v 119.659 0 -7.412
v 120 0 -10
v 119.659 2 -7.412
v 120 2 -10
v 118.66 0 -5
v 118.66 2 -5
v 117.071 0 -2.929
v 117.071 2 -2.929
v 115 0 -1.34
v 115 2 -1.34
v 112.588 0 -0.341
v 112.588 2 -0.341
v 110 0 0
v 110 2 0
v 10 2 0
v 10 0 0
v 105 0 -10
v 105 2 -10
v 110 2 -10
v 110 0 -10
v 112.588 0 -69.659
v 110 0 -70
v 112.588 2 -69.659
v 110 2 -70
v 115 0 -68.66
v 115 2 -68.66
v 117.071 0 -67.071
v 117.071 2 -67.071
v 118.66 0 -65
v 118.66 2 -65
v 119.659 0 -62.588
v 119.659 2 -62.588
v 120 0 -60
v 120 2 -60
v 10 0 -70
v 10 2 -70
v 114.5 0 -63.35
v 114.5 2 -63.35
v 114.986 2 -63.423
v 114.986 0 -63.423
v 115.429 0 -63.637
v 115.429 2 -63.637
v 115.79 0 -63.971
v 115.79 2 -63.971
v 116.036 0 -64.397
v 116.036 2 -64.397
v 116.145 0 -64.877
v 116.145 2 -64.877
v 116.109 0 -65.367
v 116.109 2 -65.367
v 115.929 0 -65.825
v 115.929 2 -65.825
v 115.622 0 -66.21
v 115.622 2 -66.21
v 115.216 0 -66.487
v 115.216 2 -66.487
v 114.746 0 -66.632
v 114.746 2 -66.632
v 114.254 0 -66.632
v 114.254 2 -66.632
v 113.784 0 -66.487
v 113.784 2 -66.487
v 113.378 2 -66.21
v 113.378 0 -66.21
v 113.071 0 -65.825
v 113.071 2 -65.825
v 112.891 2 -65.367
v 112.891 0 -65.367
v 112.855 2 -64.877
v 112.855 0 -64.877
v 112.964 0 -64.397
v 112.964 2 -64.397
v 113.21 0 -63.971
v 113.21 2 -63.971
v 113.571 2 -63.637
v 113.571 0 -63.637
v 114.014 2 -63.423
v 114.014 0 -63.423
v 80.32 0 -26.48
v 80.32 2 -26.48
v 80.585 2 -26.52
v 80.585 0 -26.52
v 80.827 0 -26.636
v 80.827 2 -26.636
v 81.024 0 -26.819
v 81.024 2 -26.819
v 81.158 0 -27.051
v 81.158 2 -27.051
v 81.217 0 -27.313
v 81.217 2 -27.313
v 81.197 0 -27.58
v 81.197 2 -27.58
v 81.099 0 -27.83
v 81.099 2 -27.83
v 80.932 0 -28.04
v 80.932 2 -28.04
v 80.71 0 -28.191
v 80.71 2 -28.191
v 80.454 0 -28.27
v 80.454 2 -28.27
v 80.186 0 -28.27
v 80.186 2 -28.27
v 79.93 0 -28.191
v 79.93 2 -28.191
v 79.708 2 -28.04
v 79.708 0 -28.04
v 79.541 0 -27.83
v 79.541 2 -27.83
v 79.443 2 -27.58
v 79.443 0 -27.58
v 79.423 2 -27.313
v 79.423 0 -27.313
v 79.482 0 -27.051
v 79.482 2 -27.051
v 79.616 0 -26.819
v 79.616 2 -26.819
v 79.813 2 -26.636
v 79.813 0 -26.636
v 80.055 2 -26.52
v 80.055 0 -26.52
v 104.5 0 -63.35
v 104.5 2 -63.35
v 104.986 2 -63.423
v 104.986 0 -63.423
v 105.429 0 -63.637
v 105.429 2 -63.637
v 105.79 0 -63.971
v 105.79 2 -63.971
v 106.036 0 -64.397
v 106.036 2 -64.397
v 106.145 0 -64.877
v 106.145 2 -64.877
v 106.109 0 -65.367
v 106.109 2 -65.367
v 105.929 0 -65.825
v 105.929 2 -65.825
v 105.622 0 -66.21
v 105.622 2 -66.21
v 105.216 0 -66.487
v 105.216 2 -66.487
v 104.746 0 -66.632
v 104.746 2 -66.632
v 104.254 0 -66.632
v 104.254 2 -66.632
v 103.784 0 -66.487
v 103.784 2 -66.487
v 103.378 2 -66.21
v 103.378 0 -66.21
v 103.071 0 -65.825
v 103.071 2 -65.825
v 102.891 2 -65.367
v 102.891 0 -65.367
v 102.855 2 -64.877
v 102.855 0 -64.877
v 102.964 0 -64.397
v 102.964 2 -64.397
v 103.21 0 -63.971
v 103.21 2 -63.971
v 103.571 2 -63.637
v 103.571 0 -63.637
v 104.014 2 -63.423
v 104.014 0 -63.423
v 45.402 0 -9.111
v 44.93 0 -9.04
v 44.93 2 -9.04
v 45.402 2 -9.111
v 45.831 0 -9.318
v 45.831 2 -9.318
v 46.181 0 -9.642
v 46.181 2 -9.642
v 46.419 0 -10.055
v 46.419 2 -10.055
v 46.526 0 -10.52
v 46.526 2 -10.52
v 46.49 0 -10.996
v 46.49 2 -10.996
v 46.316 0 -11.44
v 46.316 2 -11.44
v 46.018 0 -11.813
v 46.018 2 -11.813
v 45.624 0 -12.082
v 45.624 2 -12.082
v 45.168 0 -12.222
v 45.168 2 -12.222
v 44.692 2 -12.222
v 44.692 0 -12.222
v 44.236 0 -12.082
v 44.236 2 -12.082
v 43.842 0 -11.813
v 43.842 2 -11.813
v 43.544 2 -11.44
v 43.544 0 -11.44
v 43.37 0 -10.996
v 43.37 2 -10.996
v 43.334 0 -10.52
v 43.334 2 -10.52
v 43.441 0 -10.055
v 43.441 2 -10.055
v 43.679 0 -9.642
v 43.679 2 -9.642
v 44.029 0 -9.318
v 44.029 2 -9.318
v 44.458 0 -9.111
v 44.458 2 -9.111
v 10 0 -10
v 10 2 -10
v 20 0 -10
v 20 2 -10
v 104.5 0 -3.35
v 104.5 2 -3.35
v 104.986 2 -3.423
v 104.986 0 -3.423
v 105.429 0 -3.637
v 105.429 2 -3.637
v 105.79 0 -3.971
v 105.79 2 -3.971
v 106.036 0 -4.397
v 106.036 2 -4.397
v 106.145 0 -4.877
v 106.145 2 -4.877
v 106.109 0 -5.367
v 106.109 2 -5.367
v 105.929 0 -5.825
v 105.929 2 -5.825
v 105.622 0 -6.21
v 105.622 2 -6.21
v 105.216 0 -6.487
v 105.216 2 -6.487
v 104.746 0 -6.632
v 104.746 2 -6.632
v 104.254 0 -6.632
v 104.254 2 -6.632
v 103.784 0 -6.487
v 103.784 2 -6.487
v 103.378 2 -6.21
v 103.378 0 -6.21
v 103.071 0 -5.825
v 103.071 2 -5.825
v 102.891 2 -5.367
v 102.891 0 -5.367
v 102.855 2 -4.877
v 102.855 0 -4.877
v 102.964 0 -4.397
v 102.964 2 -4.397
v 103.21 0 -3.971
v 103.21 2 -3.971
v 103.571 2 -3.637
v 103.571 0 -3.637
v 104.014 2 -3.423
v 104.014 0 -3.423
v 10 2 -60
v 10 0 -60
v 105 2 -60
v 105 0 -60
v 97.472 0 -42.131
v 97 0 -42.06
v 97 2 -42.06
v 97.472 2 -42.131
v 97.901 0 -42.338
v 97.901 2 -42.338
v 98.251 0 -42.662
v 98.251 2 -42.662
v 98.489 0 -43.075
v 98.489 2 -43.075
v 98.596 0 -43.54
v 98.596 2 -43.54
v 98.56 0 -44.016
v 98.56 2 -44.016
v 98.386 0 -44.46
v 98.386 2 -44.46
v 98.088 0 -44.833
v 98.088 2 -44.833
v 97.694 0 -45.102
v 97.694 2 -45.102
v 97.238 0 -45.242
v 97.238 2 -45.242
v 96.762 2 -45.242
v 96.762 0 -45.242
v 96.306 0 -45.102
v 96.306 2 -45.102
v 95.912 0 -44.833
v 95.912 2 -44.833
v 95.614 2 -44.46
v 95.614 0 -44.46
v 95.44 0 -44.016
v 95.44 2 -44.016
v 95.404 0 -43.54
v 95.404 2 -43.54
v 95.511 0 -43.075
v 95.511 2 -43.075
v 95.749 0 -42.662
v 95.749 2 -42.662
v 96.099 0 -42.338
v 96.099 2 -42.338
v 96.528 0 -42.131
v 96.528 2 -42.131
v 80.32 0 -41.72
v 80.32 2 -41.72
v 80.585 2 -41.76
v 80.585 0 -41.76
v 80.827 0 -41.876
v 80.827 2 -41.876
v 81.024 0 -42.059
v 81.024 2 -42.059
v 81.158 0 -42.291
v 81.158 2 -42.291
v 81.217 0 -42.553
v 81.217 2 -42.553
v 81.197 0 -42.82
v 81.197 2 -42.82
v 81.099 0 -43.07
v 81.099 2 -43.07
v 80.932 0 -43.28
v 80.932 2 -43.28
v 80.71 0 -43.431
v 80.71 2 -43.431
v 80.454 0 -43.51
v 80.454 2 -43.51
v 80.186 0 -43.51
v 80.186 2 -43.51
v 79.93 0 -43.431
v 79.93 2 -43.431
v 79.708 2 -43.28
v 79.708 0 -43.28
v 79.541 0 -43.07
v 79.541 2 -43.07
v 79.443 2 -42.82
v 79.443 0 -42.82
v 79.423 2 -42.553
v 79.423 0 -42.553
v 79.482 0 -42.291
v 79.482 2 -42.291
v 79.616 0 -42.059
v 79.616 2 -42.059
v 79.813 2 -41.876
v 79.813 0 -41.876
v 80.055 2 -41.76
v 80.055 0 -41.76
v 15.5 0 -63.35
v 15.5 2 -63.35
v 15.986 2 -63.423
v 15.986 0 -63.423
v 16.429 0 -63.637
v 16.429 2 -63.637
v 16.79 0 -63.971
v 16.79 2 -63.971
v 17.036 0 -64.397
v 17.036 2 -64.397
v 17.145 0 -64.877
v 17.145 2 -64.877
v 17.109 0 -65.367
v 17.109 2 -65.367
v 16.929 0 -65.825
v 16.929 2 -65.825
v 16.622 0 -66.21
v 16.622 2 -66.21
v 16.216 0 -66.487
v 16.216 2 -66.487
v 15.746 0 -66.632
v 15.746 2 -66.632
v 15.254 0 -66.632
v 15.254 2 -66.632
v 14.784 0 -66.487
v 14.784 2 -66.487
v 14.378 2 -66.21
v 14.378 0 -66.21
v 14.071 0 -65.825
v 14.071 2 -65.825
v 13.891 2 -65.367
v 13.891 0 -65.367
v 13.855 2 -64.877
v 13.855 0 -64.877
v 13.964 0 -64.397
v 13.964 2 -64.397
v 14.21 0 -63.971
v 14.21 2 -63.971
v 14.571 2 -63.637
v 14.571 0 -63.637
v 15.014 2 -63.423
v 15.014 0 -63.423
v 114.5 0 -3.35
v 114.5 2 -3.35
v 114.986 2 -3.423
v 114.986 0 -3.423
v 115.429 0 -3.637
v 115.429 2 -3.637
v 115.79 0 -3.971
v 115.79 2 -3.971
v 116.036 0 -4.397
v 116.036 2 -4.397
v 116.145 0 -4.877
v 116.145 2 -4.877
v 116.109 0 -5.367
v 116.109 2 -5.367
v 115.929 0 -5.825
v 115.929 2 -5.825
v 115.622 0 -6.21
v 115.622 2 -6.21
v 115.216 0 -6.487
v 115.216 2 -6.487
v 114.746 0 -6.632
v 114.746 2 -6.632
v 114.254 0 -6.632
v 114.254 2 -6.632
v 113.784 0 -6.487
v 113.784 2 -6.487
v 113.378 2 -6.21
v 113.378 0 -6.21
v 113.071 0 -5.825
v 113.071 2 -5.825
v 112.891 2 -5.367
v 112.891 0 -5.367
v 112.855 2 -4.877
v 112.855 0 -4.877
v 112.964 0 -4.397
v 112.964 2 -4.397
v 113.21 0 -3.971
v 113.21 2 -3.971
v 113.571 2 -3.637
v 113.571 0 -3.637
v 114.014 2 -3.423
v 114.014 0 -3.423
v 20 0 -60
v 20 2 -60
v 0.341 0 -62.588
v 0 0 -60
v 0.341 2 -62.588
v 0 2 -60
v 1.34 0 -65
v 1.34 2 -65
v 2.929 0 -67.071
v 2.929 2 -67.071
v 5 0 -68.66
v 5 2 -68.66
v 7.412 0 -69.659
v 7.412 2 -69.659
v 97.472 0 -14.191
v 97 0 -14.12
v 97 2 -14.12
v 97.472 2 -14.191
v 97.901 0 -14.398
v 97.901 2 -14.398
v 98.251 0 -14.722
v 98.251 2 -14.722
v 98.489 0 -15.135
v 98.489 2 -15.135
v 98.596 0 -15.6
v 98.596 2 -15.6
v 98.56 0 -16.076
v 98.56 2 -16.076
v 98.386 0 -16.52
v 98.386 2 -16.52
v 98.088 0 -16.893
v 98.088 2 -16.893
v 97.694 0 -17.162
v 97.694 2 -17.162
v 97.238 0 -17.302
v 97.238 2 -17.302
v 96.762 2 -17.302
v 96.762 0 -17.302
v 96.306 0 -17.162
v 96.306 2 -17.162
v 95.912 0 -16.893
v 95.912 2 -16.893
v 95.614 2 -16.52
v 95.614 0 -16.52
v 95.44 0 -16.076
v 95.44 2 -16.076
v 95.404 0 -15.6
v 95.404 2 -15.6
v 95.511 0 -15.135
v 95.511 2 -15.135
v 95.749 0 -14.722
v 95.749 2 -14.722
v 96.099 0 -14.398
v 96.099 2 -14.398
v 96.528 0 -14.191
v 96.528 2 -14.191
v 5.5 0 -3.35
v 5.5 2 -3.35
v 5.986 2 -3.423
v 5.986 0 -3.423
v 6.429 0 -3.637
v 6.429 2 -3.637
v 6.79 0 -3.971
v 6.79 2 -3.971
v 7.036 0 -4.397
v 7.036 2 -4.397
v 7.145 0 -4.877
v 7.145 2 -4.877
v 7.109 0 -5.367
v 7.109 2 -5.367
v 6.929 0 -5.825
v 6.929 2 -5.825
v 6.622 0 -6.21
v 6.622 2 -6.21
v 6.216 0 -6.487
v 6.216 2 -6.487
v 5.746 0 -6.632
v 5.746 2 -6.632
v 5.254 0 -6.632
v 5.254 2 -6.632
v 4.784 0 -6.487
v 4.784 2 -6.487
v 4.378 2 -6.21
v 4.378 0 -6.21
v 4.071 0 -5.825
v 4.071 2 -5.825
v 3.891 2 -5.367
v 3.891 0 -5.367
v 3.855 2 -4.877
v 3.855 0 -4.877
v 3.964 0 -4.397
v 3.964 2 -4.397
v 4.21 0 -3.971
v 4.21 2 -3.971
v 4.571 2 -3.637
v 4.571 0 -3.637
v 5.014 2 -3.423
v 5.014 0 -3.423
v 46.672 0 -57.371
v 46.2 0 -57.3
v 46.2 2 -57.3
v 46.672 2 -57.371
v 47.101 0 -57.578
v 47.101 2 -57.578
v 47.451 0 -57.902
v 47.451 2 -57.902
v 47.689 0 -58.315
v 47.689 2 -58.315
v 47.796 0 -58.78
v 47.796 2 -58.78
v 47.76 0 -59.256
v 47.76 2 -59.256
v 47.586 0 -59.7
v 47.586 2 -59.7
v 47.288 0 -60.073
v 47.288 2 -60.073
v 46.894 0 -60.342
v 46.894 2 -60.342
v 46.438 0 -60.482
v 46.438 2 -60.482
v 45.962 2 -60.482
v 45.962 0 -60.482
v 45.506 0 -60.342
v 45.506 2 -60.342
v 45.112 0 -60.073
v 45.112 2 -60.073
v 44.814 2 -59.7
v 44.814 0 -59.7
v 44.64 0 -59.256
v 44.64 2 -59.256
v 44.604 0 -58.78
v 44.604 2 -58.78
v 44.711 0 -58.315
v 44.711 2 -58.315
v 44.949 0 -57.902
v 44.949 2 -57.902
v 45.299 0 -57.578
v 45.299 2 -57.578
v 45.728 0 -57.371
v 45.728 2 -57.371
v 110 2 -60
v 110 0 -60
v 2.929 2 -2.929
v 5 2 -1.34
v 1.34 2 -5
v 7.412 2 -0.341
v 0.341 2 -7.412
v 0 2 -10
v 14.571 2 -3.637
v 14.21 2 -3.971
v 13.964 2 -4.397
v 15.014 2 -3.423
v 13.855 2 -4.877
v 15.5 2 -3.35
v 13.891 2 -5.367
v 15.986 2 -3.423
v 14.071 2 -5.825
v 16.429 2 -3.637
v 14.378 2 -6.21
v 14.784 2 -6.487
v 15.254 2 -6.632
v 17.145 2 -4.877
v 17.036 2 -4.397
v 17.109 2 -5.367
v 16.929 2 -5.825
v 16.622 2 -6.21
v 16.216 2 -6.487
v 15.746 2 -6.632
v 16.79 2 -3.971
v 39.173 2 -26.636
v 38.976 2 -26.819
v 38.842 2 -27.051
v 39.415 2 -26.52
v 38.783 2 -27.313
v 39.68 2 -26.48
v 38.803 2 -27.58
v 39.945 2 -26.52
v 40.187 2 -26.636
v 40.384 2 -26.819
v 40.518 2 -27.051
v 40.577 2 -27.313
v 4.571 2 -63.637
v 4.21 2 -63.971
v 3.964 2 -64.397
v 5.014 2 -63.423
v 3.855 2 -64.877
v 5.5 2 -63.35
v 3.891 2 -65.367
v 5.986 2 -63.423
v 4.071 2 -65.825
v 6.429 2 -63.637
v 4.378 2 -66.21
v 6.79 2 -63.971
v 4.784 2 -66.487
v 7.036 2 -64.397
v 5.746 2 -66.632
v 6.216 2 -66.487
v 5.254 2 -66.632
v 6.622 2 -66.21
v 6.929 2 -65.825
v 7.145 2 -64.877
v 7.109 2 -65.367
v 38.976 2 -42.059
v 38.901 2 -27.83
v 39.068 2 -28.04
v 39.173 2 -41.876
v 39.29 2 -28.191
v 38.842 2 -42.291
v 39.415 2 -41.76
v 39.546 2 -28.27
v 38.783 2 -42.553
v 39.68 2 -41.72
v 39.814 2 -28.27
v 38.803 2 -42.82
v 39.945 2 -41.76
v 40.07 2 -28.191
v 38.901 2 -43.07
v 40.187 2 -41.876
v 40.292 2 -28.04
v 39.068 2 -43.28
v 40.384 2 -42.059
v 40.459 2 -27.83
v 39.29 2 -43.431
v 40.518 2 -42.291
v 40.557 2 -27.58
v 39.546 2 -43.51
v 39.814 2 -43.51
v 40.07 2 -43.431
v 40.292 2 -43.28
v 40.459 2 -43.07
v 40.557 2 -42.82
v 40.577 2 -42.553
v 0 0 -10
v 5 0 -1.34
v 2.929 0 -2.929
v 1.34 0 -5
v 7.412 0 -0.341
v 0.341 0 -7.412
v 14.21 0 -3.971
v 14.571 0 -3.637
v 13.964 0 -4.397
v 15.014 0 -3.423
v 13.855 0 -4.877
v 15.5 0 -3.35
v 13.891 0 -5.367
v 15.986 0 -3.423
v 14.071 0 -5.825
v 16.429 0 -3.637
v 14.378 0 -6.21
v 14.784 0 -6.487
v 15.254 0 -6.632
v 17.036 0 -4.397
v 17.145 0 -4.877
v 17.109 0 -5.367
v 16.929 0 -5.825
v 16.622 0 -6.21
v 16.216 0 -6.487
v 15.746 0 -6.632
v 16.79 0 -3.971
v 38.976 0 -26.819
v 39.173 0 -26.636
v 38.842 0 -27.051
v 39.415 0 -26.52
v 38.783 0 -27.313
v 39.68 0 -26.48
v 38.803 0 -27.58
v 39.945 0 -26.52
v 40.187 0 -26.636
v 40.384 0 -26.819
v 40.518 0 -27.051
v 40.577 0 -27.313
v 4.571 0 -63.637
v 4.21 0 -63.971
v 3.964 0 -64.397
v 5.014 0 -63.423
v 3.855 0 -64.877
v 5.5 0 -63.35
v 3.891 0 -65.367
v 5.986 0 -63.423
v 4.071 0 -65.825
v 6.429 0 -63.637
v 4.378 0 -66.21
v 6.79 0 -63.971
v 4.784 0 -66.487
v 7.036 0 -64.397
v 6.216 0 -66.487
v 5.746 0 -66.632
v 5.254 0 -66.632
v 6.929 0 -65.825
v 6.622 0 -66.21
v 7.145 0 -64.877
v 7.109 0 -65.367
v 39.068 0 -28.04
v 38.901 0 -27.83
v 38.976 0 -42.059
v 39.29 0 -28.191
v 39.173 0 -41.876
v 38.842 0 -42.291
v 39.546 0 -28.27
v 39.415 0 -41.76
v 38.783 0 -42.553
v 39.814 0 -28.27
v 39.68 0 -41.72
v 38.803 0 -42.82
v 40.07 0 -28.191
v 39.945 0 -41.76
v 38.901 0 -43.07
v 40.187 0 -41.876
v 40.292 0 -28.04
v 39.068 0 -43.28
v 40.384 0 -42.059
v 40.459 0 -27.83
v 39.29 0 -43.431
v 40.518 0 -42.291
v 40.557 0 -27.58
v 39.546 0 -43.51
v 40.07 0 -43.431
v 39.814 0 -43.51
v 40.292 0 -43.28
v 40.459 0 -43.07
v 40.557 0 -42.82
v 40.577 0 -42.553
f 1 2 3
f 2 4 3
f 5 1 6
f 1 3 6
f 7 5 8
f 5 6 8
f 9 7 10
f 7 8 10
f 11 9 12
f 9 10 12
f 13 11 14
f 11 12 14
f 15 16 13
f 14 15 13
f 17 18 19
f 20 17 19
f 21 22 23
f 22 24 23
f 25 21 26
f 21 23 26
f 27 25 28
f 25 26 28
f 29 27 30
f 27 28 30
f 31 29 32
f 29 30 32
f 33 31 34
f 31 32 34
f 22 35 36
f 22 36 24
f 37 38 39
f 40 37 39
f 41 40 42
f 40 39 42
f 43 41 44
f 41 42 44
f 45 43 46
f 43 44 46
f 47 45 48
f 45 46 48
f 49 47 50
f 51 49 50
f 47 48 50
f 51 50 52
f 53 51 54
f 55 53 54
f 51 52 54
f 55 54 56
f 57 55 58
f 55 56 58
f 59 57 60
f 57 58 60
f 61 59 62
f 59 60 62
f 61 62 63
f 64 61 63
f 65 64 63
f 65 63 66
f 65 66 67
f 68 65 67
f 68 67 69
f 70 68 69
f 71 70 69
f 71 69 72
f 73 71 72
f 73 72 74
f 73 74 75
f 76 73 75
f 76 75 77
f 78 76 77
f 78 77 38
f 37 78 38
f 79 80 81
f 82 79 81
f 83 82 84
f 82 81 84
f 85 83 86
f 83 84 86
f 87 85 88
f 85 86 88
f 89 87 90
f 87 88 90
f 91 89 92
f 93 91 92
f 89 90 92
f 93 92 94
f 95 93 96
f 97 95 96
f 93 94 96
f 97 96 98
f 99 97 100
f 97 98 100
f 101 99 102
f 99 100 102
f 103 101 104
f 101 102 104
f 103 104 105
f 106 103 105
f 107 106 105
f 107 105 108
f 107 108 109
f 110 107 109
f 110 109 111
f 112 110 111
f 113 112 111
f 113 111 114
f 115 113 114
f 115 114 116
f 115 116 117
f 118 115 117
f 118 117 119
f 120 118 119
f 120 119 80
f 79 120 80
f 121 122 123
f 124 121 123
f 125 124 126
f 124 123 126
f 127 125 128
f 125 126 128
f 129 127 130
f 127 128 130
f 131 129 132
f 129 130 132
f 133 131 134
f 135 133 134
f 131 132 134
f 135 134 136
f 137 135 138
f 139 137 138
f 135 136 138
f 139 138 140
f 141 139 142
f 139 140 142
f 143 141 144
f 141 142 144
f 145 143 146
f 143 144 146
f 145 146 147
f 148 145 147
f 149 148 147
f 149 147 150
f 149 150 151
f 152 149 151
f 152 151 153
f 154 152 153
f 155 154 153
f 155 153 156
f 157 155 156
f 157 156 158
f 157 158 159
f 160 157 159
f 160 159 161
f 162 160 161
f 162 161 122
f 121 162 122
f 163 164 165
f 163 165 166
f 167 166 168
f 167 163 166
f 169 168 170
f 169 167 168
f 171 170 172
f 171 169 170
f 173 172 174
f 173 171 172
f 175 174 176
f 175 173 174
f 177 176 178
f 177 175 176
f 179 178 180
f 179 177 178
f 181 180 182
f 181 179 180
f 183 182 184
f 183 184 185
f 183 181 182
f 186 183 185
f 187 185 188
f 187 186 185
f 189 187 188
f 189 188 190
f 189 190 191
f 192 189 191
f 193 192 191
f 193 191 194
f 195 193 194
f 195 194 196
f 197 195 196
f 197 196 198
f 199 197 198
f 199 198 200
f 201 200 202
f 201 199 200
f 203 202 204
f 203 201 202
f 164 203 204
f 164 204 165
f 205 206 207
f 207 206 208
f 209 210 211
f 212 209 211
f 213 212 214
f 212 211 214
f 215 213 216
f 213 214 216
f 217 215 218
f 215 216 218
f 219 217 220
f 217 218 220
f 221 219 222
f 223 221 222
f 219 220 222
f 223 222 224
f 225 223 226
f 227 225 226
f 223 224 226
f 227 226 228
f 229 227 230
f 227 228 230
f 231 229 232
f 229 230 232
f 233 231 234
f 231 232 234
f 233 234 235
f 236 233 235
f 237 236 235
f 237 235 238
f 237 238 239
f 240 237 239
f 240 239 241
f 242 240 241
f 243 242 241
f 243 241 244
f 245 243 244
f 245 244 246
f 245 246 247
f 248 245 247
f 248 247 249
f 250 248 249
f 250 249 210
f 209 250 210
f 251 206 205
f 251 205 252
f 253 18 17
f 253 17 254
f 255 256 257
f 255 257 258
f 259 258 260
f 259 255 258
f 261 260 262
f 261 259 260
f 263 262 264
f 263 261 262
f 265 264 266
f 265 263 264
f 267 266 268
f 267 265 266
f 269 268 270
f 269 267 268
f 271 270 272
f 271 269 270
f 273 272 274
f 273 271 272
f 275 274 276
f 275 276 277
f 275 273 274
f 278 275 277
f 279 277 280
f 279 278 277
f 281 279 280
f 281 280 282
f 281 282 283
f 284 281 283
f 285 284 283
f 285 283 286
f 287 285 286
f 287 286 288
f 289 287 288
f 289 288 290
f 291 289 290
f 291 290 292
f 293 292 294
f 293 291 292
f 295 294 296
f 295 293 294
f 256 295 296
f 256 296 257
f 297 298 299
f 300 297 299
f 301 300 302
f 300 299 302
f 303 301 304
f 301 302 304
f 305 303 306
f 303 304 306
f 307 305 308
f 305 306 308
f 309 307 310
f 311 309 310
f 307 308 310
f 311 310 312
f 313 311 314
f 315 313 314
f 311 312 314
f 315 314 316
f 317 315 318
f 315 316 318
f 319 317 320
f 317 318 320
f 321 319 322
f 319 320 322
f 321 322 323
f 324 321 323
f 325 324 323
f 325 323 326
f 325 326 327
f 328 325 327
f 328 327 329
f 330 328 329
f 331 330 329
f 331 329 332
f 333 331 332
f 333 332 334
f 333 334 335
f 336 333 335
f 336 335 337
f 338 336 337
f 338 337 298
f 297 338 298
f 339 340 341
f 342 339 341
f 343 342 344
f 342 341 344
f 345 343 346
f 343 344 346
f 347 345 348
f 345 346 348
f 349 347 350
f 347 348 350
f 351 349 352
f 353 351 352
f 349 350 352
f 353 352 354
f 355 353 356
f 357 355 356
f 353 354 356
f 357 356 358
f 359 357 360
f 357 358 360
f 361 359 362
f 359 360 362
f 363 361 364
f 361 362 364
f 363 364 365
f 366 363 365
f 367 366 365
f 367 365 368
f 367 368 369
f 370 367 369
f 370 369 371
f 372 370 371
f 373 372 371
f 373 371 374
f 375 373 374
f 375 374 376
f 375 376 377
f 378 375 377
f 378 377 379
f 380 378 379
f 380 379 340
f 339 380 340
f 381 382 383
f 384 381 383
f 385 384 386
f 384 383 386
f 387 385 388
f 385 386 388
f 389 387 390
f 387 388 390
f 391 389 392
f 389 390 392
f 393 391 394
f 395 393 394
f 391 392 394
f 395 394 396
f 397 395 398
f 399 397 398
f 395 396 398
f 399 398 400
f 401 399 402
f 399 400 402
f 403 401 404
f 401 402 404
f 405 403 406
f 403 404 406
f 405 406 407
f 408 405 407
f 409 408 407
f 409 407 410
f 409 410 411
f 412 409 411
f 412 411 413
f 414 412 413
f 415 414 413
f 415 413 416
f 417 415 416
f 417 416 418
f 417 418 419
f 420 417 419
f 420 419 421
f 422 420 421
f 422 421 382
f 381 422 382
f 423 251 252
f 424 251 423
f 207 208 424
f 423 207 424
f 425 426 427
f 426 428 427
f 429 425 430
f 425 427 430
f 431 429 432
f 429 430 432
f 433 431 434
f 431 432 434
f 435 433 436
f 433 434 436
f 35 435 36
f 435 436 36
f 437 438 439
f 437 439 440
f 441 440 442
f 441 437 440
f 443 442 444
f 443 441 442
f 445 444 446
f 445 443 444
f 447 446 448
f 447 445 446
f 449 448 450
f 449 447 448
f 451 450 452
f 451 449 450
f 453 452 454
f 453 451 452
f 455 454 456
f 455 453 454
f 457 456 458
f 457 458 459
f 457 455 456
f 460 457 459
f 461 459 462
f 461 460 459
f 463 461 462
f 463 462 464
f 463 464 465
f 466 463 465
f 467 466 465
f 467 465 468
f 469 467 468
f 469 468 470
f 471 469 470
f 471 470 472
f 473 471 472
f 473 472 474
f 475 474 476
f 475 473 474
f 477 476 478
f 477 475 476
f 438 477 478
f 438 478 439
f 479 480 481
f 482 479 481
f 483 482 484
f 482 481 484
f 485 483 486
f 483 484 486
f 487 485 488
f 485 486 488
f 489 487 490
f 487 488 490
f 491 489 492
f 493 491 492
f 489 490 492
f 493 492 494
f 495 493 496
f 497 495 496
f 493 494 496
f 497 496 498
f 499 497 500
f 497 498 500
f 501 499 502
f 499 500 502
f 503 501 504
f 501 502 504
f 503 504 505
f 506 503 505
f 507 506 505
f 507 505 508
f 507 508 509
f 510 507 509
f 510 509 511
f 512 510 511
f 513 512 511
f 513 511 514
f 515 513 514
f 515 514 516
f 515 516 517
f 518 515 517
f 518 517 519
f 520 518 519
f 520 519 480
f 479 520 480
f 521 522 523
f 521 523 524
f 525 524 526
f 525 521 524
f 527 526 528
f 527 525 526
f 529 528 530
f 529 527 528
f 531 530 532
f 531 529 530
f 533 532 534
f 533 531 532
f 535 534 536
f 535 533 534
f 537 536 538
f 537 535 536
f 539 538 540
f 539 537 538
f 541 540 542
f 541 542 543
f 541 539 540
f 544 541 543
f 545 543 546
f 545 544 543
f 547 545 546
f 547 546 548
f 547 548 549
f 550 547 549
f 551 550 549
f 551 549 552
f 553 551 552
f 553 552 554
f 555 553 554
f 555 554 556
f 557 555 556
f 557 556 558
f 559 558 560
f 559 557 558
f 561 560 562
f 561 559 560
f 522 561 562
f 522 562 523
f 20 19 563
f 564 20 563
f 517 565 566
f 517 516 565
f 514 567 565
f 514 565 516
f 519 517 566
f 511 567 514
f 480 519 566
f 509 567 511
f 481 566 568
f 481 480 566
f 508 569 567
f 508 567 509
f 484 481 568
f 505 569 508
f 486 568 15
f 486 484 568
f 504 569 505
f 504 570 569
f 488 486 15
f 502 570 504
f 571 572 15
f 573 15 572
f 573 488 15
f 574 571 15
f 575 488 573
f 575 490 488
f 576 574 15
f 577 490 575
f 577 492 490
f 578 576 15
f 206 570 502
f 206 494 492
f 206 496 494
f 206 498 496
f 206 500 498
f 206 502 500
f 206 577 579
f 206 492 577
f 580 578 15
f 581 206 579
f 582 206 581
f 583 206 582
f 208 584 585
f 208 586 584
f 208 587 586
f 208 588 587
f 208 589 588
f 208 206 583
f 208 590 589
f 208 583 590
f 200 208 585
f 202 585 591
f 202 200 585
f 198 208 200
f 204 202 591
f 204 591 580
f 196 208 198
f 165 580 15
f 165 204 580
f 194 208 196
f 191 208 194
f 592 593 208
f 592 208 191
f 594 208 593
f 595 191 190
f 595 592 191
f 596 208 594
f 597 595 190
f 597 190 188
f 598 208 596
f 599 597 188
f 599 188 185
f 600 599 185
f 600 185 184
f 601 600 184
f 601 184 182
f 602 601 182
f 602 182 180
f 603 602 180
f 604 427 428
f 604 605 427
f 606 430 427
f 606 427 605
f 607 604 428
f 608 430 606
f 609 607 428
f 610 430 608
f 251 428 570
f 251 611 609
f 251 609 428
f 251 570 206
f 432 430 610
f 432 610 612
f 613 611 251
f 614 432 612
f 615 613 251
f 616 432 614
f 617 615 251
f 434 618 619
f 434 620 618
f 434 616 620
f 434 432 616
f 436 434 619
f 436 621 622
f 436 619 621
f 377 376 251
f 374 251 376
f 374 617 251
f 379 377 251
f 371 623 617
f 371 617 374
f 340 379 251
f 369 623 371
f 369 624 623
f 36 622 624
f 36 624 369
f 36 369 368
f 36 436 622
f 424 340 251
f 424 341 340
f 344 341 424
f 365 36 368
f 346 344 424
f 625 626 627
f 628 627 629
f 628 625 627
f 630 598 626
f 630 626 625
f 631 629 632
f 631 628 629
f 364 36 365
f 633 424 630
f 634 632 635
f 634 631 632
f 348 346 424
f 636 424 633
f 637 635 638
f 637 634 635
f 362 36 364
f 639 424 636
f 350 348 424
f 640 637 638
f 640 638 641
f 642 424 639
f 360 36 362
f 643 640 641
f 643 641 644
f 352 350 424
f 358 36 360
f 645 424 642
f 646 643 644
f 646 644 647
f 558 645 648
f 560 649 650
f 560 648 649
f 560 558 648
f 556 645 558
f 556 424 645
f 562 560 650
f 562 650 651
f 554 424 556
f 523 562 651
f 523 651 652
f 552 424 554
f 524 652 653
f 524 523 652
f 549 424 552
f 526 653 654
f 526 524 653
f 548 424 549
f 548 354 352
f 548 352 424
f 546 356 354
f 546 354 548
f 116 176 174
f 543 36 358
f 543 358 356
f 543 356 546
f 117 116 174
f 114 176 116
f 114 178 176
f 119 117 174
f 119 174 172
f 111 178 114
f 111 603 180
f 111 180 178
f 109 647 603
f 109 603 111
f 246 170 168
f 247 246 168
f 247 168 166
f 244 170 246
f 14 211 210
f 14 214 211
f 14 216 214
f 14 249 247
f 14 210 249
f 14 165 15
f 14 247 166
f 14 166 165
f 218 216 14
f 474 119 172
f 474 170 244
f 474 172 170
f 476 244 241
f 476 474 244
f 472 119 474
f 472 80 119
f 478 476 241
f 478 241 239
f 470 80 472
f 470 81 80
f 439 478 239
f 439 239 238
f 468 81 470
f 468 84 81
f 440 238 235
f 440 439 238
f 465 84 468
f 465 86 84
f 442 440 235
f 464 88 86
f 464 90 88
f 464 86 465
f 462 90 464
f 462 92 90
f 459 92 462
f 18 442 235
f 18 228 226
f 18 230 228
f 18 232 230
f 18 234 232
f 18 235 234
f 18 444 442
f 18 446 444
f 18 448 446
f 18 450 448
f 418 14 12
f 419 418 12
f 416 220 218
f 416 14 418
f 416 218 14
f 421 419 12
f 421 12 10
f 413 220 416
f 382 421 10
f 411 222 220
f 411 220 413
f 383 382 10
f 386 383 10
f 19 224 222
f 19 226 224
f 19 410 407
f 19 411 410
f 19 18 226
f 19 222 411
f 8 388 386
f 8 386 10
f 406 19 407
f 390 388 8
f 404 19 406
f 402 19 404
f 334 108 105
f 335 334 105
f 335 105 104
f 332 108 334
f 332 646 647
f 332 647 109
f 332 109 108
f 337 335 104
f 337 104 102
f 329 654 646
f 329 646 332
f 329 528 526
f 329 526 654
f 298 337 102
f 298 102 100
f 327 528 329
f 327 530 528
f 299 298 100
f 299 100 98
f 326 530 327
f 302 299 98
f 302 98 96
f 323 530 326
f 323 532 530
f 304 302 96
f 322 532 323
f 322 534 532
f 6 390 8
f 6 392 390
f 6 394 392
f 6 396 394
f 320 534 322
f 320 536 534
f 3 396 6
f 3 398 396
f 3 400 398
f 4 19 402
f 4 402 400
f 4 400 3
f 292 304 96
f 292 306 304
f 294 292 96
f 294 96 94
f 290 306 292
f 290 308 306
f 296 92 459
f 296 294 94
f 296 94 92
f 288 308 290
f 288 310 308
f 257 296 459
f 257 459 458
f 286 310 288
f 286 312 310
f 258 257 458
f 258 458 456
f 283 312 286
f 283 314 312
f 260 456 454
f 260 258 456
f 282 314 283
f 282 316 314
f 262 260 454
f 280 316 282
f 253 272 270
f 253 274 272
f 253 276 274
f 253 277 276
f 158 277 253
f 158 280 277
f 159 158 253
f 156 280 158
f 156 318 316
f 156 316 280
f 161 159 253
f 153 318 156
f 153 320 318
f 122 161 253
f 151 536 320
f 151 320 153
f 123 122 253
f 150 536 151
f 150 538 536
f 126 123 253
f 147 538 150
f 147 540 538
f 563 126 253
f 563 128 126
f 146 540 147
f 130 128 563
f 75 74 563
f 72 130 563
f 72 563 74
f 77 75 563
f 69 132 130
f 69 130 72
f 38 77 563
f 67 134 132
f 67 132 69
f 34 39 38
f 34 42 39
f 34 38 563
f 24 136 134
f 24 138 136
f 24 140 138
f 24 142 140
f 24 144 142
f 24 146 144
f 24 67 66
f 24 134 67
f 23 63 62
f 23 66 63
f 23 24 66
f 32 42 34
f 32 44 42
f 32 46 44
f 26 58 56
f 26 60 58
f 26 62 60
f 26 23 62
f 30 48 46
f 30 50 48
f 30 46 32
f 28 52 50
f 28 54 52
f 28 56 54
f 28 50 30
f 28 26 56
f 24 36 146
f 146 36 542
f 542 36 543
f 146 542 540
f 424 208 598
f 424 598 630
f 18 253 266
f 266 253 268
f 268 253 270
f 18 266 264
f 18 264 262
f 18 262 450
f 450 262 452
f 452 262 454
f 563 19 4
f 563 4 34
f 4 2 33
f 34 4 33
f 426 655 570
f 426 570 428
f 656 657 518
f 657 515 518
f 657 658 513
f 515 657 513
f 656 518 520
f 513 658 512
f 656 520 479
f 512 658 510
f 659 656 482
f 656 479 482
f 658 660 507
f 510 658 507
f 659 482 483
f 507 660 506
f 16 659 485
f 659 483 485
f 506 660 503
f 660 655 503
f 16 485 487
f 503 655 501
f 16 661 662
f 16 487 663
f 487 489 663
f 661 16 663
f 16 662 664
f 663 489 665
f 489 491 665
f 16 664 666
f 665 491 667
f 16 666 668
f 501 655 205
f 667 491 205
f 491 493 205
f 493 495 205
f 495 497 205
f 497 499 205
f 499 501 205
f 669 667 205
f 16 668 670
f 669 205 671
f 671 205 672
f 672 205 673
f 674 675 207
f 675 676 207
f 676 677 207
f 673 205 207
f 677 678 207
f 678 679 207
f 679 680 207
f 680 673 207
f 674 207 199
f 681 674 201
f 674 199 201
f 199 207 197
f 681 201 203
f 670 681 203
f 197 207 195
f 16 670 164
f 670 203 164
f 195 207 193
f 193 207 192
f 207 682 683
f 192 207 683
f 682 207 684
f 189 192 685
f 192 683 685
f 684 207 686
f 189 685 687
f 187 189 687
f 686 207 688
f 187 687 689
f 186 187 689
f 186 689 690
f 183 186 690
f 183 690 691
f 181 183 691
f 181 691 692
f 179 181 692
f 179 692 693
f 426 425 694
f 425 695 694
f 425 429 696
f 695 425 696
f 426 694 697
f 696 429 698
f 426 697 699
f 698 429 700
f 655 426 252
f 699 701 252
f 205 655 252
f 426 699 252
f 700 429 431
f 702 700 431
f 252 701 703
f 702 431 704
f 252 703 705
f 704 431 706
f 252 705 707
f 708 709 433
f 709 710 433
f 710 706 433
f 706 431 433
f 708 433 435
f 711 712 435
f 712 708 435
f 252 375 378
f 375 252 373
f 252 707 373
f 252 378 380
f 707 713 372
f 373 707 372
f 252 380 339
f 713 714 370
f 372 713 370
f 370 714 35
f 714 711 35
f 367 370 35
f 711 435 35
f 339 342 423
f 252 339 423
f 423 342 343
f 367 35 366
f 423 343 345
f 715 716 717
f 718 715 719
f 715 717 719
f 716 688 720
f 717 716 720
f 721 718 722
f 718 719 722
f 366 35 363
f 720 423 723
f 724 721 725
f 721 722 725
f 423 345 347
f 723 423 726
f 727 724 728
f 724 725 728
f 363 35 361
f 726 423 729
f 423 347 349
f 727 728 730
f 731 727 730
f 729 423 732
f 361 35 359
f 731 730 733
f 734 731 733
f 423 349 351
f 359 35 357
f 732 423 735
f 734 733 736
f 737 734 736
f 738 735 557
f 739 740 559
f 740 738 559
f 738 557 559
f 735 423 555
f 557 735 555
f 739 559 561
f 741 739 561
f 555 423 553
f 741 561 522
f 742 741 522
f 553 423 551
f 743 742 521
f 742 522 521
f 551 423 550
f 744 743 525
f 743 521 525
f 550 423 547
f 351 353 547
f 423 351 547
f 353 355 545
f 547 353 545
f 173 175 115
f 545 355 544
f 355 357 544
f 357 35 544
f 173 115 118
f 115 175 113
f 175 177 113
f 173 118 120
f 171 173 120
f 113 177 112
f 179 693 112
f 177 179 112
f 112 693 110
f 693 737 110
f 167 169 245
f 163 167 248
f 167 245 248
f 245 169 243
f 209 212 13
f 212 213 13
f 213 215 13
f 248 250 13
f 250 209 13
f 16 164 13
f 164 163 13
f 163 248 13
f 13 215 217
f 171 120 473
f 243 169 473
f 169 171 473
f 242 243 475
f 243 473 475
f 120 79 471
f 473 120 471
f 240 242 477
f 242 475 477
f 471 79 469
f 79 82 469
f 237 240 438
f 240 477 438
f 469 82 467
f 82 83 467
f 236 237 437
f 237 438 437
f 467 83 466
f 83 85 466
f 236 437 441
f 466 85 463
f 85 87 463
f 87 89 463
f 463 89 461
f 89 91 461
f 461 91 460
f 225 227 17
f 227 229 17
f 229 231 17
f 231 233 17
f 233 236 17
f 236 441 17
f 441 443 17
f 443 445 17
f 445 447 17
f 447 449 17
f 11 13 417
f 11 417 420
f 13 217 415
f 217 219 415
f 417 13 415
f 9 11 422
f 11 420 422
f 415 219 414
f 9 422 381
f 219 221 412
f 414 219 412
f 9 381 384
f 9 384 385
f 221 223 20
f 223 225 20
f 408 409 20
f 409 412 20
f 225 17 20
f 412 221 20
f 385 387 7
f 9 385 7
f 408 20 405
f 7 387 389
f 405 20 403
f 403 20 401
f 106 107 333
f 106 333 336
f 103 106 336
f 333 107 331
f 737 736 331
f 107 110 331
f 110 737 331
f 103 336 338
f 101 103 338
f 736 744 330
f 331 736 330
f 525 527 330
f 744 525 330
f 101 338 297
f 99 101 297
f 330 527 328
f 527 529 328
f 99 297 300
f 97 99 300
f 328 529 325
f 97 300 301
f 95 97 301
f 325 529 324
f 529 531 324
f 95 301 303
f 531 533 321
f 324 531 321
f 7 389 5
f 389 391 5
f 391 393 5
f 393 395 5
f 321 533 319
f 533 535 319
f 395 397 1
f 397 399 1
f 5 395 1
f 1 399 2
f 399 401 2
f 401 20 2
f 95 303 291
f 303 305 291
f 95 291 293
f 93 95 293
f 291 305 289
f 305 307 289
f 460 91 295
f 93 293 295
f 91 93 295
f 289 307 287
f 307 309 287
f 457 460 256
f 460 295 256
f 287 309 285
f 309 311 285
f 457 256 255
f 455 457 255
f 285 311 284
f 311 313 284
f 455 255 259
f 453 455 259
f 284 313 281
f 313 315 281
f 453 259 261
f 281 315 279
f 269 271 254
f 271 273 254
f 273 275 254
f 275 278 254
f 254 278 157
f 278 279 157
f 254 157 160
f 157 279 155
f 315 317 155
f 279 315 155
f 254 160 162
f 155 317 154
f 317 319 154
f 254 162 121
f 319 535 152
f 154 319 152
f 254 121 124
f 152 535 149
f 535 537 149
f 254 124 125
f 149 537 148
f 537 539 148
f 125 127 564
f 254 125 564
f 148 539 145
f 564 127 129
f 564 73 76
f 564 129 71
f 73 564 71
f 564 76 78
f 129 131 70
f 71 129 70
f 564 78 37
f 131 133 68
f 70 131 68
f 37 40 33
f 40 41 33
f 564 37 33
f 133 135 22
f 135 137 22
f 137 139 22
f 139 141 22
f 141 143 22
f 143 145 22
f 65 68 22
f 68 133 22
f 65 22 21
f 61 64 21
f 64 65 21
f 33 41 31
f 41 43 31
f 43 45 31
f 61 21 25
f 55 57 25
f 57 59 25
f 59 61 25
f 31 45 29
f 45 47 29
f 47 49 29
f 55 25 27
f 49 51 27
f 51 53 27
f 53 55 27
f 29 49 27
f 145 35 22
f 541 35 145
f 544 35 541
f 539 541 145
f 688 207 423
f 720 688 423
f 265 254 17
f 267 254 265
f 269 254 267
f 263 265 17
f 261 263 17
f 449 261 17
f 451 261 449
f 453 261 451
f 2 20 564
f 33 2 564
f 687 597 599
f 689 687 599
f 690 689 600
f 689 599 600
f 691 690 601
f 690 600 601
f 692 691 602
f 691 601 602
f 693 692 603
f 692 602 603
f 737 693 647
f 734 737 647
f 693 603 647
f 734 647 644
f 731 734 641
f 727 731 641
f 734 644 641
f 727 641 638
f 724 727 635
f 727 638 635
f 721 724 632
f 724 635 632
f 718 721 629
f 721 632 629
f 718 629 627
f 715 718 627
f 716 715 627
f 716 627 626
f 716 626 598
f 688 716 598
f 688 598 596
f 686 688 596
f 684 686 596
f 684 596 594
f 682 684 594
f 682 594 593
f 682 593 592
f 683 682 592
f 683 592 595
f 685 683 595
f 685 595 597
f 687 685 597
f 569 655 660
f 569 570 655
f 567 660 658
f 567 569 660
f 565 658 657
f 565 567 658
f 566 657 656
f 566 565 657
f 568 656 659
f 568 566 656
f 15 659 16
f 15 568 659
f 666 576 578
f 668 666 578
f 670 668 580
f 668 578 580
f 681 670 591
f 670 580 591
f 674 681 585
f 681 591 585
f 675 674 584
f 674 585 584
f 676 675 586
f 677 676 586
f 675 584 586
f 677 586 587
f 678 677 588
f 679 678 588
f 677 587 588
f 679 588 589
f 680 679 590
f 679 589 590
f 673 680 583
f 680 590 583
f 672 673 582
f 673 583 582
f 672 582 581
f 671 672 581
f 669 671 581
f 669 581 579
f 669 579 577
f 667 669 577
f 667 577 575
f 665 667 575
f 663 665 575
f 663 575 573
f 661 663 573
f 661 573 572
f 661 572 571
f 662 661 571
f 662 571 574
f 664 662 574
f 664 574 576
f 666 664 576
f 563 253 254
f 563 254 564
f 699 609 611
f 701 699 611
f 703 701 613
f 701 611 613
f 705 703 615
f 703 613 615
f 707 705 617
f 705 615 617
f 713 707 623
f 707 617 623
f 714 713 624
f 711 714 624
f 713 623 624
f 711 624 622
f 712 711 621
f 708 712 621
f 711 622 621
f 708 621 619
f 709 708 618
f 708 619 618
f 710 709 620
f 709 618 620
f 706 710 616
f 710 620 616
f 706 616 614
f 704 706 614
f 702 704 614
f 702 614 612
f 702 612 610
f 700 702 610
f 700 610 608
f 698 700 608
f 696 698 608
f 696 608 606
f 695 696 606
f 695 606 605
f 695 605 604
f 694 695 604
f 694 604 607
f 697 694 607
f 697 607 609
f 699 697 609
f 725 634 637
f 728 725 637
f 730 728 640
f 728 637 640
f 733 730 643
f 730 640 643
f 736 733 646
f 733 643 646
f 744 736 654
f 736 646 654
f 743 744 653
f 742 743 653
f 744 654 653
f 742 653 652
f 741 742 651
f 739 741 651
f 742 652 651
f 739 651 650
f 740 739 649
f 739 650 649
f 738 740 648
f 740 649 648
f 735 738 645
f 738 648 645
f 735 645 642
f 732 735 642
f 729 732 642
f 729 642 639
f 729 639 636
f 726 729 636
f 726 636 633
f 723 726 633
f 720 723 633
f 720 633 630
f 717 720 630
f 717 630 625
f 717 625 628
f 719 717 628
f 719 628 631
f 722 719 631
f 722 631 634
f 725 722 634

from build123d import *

# Parameters (mm, degrees)
PLANTAICEZUM_W          = 120
PLANTAICEZUM_H          = 70
PLANTAICEZUM_R          = 1.6
SALIENTE_EXTRUIR3_DEPTH = 2
REDONDEO1_R             = 10
REDONDEO2_R             = 10
REDONDEO3_R             = 10
REDONDEO4_R             = 10
CROQUIS1_W              = 10
CROQUIS1_H              = 50
CROQUIS1_W_2            = 5
CORTAR_EXTRUIR1_DEPTH   = 5
CROQUIS4_R              = 1.65
CORTAR_EXTRUIR2_DEPTH   = 5
CROQUIS6_R              = 0.9
CORTAR_EXTRUIR4_DEPTH   = 10


with BuildPart() as part:
    # PlantaIceZum → Saliente-Extruir3 (new body)
    with BuildSketch(Plane(origin=(0, 0, 0), x_dir=(1, 0, 0), z_dir=(0, 1, 0))):
        with Locations((60, 35)):
            Rectangle(PLANTAICEZUM_W, PLANTAICEZUM_H)
        with Locations(Location((97, 43.66, 0), (0, 0, 270))):
            Circle(PLANTAICEZUM_R, mode=Mode.SUBTRACT)
        with Locations(Location((46.2, 58.9, 0), (0, 0, 270))):
            Circle(PLANTAICEZUM_R, mode=Mode.SUBTRACT)
        with Locations(Location((44.93, 10.64, 0), (0, 0, 270))):
            Circle(PLANTAICEZUM_R, mode=Mode.SUBTRACT)
        with Locations(Location((97, 15.72, 0), (0, 0, 270))):
            Circle(PLANTAICEZUM_R, mode=Mode.SUBTRACT)
    extrude(amount=SALIENTE_EXTRUIR3_DEPTH)

    # Redondeo1
    redondeo1_edges = [part.edges().sort_by_distance(p)[0] for p in [
        (0, 1, 0),
    ]]
    fillet(redondeo1_edges, radius=REDONDEO1_R)

    # Redondeo2
    redondeo2_edges = [part.edges().sort_by_distance(p)[0] for p in [
        (0, 1, -70),
    ]]
    fillet(redondeo2_edges, radius=REDONDEO2_R)

    # Redondeo3
    redondeo3_edges = [part.edges().sort_by_distance(p)[0] for p in [
        (120, 1, -70),
    ]]
    fillet(redondeo3_edges, radius=REDONDEO3_R)

    # Redondeo4
    redondeo4_edges = [part.edges().sort_by_distance(p)[0] for p in [
        (120, 1, 0),
    ]]
    fillet(redondeo4_edges, radius=REDONDEO4_R)

    # Croquis1 → Cortar-Extruir1 (cut)
    with BuildSketch(Plane(origin=(0, 2, 0), x_dir=(1, 0, 0), z_dir=(0, 1, 0))):
        with Locations((15, 35)):
            Rectangle(CROQUIS1_W, CROQUIS1_H)
        with Locations((107.5, 35)):
            Rectangle(CROQUIS1_W_2, CROQUIS1_H)
    extrude(amount=-CORTAR_EXTRUIR1_DEPTH, mode=Mode.SUBTRACT)

    # Croquis4 → Cortar-Extruir2 (cut)
    with BuildSketch(Plane(origin=(0, 2, 0), x_dir=(1, 0, 0), z_dir=(0, 1, 0))):
        with Locations(Location((5.5, 65, 0), (0, 0, 270))):
            Circle(CROQUIS4_R)
        with Locations(Location((114.5, 65, 0), (0, 0, 270))):
            Circle(CROQUIS4_R)
        with Locations(Location((5.5, 5, 0), (0, 0, 270))):
            Circle(CROQUIS4_R)
        with Locations(Location((114.5, 5, 0), (0, 0, 270))):
            Circle(CROQUIS4_R)
        with Locations(Location((15.5, 65, 0), (0, 0, 270))):
            Circle(CROQUIS4_R)
        with Locations(Location((104.5, 65, 0), (0, 0, 270))):
            Circle(CROQUIS4_R)
        with Locations(Location((15.5, 5, 0), (0, 0, 270))):
            Circle(CROQUIS4_R)
        with Locations(Location((104.5, 5, 0), (0, 0, 270))):
            Circle(CROQUIS4_R)
    extrude(amount=-CORTAR_EXTRUIR2_DEPTH, mode=Mode.SUBTRACT)

    # Croquis6 → Cortar-Extruir4 (cut)
    with BuildSketch(Plane(origin=(0, 2, 0), x_dir=(1, 0, 0), z_dir=(0, 1, 0))):
        with Locations(Location((39.68, 42.62, 0), (0, 0, 270))):
            Circle(CROQUIS6_R)
        with Locations(Location((39.68, 27.38, 0), (0, 0, 270))):
            Circle(CROQUIS6_R)
        with Locations(Location((80.32, 42.62, 0), (0, 0, 270))):
            Circle(CROQUIS6_R)
        with Locations(Location((80.32, 27.38, 0), (0, 0, 270))):
            Circle(CROQUIS6_R)
    extrude(amount=-CORTAR_EXTRUIR4_DEPTH, mode=Mode.SUBTRACT)


solid = part.part
